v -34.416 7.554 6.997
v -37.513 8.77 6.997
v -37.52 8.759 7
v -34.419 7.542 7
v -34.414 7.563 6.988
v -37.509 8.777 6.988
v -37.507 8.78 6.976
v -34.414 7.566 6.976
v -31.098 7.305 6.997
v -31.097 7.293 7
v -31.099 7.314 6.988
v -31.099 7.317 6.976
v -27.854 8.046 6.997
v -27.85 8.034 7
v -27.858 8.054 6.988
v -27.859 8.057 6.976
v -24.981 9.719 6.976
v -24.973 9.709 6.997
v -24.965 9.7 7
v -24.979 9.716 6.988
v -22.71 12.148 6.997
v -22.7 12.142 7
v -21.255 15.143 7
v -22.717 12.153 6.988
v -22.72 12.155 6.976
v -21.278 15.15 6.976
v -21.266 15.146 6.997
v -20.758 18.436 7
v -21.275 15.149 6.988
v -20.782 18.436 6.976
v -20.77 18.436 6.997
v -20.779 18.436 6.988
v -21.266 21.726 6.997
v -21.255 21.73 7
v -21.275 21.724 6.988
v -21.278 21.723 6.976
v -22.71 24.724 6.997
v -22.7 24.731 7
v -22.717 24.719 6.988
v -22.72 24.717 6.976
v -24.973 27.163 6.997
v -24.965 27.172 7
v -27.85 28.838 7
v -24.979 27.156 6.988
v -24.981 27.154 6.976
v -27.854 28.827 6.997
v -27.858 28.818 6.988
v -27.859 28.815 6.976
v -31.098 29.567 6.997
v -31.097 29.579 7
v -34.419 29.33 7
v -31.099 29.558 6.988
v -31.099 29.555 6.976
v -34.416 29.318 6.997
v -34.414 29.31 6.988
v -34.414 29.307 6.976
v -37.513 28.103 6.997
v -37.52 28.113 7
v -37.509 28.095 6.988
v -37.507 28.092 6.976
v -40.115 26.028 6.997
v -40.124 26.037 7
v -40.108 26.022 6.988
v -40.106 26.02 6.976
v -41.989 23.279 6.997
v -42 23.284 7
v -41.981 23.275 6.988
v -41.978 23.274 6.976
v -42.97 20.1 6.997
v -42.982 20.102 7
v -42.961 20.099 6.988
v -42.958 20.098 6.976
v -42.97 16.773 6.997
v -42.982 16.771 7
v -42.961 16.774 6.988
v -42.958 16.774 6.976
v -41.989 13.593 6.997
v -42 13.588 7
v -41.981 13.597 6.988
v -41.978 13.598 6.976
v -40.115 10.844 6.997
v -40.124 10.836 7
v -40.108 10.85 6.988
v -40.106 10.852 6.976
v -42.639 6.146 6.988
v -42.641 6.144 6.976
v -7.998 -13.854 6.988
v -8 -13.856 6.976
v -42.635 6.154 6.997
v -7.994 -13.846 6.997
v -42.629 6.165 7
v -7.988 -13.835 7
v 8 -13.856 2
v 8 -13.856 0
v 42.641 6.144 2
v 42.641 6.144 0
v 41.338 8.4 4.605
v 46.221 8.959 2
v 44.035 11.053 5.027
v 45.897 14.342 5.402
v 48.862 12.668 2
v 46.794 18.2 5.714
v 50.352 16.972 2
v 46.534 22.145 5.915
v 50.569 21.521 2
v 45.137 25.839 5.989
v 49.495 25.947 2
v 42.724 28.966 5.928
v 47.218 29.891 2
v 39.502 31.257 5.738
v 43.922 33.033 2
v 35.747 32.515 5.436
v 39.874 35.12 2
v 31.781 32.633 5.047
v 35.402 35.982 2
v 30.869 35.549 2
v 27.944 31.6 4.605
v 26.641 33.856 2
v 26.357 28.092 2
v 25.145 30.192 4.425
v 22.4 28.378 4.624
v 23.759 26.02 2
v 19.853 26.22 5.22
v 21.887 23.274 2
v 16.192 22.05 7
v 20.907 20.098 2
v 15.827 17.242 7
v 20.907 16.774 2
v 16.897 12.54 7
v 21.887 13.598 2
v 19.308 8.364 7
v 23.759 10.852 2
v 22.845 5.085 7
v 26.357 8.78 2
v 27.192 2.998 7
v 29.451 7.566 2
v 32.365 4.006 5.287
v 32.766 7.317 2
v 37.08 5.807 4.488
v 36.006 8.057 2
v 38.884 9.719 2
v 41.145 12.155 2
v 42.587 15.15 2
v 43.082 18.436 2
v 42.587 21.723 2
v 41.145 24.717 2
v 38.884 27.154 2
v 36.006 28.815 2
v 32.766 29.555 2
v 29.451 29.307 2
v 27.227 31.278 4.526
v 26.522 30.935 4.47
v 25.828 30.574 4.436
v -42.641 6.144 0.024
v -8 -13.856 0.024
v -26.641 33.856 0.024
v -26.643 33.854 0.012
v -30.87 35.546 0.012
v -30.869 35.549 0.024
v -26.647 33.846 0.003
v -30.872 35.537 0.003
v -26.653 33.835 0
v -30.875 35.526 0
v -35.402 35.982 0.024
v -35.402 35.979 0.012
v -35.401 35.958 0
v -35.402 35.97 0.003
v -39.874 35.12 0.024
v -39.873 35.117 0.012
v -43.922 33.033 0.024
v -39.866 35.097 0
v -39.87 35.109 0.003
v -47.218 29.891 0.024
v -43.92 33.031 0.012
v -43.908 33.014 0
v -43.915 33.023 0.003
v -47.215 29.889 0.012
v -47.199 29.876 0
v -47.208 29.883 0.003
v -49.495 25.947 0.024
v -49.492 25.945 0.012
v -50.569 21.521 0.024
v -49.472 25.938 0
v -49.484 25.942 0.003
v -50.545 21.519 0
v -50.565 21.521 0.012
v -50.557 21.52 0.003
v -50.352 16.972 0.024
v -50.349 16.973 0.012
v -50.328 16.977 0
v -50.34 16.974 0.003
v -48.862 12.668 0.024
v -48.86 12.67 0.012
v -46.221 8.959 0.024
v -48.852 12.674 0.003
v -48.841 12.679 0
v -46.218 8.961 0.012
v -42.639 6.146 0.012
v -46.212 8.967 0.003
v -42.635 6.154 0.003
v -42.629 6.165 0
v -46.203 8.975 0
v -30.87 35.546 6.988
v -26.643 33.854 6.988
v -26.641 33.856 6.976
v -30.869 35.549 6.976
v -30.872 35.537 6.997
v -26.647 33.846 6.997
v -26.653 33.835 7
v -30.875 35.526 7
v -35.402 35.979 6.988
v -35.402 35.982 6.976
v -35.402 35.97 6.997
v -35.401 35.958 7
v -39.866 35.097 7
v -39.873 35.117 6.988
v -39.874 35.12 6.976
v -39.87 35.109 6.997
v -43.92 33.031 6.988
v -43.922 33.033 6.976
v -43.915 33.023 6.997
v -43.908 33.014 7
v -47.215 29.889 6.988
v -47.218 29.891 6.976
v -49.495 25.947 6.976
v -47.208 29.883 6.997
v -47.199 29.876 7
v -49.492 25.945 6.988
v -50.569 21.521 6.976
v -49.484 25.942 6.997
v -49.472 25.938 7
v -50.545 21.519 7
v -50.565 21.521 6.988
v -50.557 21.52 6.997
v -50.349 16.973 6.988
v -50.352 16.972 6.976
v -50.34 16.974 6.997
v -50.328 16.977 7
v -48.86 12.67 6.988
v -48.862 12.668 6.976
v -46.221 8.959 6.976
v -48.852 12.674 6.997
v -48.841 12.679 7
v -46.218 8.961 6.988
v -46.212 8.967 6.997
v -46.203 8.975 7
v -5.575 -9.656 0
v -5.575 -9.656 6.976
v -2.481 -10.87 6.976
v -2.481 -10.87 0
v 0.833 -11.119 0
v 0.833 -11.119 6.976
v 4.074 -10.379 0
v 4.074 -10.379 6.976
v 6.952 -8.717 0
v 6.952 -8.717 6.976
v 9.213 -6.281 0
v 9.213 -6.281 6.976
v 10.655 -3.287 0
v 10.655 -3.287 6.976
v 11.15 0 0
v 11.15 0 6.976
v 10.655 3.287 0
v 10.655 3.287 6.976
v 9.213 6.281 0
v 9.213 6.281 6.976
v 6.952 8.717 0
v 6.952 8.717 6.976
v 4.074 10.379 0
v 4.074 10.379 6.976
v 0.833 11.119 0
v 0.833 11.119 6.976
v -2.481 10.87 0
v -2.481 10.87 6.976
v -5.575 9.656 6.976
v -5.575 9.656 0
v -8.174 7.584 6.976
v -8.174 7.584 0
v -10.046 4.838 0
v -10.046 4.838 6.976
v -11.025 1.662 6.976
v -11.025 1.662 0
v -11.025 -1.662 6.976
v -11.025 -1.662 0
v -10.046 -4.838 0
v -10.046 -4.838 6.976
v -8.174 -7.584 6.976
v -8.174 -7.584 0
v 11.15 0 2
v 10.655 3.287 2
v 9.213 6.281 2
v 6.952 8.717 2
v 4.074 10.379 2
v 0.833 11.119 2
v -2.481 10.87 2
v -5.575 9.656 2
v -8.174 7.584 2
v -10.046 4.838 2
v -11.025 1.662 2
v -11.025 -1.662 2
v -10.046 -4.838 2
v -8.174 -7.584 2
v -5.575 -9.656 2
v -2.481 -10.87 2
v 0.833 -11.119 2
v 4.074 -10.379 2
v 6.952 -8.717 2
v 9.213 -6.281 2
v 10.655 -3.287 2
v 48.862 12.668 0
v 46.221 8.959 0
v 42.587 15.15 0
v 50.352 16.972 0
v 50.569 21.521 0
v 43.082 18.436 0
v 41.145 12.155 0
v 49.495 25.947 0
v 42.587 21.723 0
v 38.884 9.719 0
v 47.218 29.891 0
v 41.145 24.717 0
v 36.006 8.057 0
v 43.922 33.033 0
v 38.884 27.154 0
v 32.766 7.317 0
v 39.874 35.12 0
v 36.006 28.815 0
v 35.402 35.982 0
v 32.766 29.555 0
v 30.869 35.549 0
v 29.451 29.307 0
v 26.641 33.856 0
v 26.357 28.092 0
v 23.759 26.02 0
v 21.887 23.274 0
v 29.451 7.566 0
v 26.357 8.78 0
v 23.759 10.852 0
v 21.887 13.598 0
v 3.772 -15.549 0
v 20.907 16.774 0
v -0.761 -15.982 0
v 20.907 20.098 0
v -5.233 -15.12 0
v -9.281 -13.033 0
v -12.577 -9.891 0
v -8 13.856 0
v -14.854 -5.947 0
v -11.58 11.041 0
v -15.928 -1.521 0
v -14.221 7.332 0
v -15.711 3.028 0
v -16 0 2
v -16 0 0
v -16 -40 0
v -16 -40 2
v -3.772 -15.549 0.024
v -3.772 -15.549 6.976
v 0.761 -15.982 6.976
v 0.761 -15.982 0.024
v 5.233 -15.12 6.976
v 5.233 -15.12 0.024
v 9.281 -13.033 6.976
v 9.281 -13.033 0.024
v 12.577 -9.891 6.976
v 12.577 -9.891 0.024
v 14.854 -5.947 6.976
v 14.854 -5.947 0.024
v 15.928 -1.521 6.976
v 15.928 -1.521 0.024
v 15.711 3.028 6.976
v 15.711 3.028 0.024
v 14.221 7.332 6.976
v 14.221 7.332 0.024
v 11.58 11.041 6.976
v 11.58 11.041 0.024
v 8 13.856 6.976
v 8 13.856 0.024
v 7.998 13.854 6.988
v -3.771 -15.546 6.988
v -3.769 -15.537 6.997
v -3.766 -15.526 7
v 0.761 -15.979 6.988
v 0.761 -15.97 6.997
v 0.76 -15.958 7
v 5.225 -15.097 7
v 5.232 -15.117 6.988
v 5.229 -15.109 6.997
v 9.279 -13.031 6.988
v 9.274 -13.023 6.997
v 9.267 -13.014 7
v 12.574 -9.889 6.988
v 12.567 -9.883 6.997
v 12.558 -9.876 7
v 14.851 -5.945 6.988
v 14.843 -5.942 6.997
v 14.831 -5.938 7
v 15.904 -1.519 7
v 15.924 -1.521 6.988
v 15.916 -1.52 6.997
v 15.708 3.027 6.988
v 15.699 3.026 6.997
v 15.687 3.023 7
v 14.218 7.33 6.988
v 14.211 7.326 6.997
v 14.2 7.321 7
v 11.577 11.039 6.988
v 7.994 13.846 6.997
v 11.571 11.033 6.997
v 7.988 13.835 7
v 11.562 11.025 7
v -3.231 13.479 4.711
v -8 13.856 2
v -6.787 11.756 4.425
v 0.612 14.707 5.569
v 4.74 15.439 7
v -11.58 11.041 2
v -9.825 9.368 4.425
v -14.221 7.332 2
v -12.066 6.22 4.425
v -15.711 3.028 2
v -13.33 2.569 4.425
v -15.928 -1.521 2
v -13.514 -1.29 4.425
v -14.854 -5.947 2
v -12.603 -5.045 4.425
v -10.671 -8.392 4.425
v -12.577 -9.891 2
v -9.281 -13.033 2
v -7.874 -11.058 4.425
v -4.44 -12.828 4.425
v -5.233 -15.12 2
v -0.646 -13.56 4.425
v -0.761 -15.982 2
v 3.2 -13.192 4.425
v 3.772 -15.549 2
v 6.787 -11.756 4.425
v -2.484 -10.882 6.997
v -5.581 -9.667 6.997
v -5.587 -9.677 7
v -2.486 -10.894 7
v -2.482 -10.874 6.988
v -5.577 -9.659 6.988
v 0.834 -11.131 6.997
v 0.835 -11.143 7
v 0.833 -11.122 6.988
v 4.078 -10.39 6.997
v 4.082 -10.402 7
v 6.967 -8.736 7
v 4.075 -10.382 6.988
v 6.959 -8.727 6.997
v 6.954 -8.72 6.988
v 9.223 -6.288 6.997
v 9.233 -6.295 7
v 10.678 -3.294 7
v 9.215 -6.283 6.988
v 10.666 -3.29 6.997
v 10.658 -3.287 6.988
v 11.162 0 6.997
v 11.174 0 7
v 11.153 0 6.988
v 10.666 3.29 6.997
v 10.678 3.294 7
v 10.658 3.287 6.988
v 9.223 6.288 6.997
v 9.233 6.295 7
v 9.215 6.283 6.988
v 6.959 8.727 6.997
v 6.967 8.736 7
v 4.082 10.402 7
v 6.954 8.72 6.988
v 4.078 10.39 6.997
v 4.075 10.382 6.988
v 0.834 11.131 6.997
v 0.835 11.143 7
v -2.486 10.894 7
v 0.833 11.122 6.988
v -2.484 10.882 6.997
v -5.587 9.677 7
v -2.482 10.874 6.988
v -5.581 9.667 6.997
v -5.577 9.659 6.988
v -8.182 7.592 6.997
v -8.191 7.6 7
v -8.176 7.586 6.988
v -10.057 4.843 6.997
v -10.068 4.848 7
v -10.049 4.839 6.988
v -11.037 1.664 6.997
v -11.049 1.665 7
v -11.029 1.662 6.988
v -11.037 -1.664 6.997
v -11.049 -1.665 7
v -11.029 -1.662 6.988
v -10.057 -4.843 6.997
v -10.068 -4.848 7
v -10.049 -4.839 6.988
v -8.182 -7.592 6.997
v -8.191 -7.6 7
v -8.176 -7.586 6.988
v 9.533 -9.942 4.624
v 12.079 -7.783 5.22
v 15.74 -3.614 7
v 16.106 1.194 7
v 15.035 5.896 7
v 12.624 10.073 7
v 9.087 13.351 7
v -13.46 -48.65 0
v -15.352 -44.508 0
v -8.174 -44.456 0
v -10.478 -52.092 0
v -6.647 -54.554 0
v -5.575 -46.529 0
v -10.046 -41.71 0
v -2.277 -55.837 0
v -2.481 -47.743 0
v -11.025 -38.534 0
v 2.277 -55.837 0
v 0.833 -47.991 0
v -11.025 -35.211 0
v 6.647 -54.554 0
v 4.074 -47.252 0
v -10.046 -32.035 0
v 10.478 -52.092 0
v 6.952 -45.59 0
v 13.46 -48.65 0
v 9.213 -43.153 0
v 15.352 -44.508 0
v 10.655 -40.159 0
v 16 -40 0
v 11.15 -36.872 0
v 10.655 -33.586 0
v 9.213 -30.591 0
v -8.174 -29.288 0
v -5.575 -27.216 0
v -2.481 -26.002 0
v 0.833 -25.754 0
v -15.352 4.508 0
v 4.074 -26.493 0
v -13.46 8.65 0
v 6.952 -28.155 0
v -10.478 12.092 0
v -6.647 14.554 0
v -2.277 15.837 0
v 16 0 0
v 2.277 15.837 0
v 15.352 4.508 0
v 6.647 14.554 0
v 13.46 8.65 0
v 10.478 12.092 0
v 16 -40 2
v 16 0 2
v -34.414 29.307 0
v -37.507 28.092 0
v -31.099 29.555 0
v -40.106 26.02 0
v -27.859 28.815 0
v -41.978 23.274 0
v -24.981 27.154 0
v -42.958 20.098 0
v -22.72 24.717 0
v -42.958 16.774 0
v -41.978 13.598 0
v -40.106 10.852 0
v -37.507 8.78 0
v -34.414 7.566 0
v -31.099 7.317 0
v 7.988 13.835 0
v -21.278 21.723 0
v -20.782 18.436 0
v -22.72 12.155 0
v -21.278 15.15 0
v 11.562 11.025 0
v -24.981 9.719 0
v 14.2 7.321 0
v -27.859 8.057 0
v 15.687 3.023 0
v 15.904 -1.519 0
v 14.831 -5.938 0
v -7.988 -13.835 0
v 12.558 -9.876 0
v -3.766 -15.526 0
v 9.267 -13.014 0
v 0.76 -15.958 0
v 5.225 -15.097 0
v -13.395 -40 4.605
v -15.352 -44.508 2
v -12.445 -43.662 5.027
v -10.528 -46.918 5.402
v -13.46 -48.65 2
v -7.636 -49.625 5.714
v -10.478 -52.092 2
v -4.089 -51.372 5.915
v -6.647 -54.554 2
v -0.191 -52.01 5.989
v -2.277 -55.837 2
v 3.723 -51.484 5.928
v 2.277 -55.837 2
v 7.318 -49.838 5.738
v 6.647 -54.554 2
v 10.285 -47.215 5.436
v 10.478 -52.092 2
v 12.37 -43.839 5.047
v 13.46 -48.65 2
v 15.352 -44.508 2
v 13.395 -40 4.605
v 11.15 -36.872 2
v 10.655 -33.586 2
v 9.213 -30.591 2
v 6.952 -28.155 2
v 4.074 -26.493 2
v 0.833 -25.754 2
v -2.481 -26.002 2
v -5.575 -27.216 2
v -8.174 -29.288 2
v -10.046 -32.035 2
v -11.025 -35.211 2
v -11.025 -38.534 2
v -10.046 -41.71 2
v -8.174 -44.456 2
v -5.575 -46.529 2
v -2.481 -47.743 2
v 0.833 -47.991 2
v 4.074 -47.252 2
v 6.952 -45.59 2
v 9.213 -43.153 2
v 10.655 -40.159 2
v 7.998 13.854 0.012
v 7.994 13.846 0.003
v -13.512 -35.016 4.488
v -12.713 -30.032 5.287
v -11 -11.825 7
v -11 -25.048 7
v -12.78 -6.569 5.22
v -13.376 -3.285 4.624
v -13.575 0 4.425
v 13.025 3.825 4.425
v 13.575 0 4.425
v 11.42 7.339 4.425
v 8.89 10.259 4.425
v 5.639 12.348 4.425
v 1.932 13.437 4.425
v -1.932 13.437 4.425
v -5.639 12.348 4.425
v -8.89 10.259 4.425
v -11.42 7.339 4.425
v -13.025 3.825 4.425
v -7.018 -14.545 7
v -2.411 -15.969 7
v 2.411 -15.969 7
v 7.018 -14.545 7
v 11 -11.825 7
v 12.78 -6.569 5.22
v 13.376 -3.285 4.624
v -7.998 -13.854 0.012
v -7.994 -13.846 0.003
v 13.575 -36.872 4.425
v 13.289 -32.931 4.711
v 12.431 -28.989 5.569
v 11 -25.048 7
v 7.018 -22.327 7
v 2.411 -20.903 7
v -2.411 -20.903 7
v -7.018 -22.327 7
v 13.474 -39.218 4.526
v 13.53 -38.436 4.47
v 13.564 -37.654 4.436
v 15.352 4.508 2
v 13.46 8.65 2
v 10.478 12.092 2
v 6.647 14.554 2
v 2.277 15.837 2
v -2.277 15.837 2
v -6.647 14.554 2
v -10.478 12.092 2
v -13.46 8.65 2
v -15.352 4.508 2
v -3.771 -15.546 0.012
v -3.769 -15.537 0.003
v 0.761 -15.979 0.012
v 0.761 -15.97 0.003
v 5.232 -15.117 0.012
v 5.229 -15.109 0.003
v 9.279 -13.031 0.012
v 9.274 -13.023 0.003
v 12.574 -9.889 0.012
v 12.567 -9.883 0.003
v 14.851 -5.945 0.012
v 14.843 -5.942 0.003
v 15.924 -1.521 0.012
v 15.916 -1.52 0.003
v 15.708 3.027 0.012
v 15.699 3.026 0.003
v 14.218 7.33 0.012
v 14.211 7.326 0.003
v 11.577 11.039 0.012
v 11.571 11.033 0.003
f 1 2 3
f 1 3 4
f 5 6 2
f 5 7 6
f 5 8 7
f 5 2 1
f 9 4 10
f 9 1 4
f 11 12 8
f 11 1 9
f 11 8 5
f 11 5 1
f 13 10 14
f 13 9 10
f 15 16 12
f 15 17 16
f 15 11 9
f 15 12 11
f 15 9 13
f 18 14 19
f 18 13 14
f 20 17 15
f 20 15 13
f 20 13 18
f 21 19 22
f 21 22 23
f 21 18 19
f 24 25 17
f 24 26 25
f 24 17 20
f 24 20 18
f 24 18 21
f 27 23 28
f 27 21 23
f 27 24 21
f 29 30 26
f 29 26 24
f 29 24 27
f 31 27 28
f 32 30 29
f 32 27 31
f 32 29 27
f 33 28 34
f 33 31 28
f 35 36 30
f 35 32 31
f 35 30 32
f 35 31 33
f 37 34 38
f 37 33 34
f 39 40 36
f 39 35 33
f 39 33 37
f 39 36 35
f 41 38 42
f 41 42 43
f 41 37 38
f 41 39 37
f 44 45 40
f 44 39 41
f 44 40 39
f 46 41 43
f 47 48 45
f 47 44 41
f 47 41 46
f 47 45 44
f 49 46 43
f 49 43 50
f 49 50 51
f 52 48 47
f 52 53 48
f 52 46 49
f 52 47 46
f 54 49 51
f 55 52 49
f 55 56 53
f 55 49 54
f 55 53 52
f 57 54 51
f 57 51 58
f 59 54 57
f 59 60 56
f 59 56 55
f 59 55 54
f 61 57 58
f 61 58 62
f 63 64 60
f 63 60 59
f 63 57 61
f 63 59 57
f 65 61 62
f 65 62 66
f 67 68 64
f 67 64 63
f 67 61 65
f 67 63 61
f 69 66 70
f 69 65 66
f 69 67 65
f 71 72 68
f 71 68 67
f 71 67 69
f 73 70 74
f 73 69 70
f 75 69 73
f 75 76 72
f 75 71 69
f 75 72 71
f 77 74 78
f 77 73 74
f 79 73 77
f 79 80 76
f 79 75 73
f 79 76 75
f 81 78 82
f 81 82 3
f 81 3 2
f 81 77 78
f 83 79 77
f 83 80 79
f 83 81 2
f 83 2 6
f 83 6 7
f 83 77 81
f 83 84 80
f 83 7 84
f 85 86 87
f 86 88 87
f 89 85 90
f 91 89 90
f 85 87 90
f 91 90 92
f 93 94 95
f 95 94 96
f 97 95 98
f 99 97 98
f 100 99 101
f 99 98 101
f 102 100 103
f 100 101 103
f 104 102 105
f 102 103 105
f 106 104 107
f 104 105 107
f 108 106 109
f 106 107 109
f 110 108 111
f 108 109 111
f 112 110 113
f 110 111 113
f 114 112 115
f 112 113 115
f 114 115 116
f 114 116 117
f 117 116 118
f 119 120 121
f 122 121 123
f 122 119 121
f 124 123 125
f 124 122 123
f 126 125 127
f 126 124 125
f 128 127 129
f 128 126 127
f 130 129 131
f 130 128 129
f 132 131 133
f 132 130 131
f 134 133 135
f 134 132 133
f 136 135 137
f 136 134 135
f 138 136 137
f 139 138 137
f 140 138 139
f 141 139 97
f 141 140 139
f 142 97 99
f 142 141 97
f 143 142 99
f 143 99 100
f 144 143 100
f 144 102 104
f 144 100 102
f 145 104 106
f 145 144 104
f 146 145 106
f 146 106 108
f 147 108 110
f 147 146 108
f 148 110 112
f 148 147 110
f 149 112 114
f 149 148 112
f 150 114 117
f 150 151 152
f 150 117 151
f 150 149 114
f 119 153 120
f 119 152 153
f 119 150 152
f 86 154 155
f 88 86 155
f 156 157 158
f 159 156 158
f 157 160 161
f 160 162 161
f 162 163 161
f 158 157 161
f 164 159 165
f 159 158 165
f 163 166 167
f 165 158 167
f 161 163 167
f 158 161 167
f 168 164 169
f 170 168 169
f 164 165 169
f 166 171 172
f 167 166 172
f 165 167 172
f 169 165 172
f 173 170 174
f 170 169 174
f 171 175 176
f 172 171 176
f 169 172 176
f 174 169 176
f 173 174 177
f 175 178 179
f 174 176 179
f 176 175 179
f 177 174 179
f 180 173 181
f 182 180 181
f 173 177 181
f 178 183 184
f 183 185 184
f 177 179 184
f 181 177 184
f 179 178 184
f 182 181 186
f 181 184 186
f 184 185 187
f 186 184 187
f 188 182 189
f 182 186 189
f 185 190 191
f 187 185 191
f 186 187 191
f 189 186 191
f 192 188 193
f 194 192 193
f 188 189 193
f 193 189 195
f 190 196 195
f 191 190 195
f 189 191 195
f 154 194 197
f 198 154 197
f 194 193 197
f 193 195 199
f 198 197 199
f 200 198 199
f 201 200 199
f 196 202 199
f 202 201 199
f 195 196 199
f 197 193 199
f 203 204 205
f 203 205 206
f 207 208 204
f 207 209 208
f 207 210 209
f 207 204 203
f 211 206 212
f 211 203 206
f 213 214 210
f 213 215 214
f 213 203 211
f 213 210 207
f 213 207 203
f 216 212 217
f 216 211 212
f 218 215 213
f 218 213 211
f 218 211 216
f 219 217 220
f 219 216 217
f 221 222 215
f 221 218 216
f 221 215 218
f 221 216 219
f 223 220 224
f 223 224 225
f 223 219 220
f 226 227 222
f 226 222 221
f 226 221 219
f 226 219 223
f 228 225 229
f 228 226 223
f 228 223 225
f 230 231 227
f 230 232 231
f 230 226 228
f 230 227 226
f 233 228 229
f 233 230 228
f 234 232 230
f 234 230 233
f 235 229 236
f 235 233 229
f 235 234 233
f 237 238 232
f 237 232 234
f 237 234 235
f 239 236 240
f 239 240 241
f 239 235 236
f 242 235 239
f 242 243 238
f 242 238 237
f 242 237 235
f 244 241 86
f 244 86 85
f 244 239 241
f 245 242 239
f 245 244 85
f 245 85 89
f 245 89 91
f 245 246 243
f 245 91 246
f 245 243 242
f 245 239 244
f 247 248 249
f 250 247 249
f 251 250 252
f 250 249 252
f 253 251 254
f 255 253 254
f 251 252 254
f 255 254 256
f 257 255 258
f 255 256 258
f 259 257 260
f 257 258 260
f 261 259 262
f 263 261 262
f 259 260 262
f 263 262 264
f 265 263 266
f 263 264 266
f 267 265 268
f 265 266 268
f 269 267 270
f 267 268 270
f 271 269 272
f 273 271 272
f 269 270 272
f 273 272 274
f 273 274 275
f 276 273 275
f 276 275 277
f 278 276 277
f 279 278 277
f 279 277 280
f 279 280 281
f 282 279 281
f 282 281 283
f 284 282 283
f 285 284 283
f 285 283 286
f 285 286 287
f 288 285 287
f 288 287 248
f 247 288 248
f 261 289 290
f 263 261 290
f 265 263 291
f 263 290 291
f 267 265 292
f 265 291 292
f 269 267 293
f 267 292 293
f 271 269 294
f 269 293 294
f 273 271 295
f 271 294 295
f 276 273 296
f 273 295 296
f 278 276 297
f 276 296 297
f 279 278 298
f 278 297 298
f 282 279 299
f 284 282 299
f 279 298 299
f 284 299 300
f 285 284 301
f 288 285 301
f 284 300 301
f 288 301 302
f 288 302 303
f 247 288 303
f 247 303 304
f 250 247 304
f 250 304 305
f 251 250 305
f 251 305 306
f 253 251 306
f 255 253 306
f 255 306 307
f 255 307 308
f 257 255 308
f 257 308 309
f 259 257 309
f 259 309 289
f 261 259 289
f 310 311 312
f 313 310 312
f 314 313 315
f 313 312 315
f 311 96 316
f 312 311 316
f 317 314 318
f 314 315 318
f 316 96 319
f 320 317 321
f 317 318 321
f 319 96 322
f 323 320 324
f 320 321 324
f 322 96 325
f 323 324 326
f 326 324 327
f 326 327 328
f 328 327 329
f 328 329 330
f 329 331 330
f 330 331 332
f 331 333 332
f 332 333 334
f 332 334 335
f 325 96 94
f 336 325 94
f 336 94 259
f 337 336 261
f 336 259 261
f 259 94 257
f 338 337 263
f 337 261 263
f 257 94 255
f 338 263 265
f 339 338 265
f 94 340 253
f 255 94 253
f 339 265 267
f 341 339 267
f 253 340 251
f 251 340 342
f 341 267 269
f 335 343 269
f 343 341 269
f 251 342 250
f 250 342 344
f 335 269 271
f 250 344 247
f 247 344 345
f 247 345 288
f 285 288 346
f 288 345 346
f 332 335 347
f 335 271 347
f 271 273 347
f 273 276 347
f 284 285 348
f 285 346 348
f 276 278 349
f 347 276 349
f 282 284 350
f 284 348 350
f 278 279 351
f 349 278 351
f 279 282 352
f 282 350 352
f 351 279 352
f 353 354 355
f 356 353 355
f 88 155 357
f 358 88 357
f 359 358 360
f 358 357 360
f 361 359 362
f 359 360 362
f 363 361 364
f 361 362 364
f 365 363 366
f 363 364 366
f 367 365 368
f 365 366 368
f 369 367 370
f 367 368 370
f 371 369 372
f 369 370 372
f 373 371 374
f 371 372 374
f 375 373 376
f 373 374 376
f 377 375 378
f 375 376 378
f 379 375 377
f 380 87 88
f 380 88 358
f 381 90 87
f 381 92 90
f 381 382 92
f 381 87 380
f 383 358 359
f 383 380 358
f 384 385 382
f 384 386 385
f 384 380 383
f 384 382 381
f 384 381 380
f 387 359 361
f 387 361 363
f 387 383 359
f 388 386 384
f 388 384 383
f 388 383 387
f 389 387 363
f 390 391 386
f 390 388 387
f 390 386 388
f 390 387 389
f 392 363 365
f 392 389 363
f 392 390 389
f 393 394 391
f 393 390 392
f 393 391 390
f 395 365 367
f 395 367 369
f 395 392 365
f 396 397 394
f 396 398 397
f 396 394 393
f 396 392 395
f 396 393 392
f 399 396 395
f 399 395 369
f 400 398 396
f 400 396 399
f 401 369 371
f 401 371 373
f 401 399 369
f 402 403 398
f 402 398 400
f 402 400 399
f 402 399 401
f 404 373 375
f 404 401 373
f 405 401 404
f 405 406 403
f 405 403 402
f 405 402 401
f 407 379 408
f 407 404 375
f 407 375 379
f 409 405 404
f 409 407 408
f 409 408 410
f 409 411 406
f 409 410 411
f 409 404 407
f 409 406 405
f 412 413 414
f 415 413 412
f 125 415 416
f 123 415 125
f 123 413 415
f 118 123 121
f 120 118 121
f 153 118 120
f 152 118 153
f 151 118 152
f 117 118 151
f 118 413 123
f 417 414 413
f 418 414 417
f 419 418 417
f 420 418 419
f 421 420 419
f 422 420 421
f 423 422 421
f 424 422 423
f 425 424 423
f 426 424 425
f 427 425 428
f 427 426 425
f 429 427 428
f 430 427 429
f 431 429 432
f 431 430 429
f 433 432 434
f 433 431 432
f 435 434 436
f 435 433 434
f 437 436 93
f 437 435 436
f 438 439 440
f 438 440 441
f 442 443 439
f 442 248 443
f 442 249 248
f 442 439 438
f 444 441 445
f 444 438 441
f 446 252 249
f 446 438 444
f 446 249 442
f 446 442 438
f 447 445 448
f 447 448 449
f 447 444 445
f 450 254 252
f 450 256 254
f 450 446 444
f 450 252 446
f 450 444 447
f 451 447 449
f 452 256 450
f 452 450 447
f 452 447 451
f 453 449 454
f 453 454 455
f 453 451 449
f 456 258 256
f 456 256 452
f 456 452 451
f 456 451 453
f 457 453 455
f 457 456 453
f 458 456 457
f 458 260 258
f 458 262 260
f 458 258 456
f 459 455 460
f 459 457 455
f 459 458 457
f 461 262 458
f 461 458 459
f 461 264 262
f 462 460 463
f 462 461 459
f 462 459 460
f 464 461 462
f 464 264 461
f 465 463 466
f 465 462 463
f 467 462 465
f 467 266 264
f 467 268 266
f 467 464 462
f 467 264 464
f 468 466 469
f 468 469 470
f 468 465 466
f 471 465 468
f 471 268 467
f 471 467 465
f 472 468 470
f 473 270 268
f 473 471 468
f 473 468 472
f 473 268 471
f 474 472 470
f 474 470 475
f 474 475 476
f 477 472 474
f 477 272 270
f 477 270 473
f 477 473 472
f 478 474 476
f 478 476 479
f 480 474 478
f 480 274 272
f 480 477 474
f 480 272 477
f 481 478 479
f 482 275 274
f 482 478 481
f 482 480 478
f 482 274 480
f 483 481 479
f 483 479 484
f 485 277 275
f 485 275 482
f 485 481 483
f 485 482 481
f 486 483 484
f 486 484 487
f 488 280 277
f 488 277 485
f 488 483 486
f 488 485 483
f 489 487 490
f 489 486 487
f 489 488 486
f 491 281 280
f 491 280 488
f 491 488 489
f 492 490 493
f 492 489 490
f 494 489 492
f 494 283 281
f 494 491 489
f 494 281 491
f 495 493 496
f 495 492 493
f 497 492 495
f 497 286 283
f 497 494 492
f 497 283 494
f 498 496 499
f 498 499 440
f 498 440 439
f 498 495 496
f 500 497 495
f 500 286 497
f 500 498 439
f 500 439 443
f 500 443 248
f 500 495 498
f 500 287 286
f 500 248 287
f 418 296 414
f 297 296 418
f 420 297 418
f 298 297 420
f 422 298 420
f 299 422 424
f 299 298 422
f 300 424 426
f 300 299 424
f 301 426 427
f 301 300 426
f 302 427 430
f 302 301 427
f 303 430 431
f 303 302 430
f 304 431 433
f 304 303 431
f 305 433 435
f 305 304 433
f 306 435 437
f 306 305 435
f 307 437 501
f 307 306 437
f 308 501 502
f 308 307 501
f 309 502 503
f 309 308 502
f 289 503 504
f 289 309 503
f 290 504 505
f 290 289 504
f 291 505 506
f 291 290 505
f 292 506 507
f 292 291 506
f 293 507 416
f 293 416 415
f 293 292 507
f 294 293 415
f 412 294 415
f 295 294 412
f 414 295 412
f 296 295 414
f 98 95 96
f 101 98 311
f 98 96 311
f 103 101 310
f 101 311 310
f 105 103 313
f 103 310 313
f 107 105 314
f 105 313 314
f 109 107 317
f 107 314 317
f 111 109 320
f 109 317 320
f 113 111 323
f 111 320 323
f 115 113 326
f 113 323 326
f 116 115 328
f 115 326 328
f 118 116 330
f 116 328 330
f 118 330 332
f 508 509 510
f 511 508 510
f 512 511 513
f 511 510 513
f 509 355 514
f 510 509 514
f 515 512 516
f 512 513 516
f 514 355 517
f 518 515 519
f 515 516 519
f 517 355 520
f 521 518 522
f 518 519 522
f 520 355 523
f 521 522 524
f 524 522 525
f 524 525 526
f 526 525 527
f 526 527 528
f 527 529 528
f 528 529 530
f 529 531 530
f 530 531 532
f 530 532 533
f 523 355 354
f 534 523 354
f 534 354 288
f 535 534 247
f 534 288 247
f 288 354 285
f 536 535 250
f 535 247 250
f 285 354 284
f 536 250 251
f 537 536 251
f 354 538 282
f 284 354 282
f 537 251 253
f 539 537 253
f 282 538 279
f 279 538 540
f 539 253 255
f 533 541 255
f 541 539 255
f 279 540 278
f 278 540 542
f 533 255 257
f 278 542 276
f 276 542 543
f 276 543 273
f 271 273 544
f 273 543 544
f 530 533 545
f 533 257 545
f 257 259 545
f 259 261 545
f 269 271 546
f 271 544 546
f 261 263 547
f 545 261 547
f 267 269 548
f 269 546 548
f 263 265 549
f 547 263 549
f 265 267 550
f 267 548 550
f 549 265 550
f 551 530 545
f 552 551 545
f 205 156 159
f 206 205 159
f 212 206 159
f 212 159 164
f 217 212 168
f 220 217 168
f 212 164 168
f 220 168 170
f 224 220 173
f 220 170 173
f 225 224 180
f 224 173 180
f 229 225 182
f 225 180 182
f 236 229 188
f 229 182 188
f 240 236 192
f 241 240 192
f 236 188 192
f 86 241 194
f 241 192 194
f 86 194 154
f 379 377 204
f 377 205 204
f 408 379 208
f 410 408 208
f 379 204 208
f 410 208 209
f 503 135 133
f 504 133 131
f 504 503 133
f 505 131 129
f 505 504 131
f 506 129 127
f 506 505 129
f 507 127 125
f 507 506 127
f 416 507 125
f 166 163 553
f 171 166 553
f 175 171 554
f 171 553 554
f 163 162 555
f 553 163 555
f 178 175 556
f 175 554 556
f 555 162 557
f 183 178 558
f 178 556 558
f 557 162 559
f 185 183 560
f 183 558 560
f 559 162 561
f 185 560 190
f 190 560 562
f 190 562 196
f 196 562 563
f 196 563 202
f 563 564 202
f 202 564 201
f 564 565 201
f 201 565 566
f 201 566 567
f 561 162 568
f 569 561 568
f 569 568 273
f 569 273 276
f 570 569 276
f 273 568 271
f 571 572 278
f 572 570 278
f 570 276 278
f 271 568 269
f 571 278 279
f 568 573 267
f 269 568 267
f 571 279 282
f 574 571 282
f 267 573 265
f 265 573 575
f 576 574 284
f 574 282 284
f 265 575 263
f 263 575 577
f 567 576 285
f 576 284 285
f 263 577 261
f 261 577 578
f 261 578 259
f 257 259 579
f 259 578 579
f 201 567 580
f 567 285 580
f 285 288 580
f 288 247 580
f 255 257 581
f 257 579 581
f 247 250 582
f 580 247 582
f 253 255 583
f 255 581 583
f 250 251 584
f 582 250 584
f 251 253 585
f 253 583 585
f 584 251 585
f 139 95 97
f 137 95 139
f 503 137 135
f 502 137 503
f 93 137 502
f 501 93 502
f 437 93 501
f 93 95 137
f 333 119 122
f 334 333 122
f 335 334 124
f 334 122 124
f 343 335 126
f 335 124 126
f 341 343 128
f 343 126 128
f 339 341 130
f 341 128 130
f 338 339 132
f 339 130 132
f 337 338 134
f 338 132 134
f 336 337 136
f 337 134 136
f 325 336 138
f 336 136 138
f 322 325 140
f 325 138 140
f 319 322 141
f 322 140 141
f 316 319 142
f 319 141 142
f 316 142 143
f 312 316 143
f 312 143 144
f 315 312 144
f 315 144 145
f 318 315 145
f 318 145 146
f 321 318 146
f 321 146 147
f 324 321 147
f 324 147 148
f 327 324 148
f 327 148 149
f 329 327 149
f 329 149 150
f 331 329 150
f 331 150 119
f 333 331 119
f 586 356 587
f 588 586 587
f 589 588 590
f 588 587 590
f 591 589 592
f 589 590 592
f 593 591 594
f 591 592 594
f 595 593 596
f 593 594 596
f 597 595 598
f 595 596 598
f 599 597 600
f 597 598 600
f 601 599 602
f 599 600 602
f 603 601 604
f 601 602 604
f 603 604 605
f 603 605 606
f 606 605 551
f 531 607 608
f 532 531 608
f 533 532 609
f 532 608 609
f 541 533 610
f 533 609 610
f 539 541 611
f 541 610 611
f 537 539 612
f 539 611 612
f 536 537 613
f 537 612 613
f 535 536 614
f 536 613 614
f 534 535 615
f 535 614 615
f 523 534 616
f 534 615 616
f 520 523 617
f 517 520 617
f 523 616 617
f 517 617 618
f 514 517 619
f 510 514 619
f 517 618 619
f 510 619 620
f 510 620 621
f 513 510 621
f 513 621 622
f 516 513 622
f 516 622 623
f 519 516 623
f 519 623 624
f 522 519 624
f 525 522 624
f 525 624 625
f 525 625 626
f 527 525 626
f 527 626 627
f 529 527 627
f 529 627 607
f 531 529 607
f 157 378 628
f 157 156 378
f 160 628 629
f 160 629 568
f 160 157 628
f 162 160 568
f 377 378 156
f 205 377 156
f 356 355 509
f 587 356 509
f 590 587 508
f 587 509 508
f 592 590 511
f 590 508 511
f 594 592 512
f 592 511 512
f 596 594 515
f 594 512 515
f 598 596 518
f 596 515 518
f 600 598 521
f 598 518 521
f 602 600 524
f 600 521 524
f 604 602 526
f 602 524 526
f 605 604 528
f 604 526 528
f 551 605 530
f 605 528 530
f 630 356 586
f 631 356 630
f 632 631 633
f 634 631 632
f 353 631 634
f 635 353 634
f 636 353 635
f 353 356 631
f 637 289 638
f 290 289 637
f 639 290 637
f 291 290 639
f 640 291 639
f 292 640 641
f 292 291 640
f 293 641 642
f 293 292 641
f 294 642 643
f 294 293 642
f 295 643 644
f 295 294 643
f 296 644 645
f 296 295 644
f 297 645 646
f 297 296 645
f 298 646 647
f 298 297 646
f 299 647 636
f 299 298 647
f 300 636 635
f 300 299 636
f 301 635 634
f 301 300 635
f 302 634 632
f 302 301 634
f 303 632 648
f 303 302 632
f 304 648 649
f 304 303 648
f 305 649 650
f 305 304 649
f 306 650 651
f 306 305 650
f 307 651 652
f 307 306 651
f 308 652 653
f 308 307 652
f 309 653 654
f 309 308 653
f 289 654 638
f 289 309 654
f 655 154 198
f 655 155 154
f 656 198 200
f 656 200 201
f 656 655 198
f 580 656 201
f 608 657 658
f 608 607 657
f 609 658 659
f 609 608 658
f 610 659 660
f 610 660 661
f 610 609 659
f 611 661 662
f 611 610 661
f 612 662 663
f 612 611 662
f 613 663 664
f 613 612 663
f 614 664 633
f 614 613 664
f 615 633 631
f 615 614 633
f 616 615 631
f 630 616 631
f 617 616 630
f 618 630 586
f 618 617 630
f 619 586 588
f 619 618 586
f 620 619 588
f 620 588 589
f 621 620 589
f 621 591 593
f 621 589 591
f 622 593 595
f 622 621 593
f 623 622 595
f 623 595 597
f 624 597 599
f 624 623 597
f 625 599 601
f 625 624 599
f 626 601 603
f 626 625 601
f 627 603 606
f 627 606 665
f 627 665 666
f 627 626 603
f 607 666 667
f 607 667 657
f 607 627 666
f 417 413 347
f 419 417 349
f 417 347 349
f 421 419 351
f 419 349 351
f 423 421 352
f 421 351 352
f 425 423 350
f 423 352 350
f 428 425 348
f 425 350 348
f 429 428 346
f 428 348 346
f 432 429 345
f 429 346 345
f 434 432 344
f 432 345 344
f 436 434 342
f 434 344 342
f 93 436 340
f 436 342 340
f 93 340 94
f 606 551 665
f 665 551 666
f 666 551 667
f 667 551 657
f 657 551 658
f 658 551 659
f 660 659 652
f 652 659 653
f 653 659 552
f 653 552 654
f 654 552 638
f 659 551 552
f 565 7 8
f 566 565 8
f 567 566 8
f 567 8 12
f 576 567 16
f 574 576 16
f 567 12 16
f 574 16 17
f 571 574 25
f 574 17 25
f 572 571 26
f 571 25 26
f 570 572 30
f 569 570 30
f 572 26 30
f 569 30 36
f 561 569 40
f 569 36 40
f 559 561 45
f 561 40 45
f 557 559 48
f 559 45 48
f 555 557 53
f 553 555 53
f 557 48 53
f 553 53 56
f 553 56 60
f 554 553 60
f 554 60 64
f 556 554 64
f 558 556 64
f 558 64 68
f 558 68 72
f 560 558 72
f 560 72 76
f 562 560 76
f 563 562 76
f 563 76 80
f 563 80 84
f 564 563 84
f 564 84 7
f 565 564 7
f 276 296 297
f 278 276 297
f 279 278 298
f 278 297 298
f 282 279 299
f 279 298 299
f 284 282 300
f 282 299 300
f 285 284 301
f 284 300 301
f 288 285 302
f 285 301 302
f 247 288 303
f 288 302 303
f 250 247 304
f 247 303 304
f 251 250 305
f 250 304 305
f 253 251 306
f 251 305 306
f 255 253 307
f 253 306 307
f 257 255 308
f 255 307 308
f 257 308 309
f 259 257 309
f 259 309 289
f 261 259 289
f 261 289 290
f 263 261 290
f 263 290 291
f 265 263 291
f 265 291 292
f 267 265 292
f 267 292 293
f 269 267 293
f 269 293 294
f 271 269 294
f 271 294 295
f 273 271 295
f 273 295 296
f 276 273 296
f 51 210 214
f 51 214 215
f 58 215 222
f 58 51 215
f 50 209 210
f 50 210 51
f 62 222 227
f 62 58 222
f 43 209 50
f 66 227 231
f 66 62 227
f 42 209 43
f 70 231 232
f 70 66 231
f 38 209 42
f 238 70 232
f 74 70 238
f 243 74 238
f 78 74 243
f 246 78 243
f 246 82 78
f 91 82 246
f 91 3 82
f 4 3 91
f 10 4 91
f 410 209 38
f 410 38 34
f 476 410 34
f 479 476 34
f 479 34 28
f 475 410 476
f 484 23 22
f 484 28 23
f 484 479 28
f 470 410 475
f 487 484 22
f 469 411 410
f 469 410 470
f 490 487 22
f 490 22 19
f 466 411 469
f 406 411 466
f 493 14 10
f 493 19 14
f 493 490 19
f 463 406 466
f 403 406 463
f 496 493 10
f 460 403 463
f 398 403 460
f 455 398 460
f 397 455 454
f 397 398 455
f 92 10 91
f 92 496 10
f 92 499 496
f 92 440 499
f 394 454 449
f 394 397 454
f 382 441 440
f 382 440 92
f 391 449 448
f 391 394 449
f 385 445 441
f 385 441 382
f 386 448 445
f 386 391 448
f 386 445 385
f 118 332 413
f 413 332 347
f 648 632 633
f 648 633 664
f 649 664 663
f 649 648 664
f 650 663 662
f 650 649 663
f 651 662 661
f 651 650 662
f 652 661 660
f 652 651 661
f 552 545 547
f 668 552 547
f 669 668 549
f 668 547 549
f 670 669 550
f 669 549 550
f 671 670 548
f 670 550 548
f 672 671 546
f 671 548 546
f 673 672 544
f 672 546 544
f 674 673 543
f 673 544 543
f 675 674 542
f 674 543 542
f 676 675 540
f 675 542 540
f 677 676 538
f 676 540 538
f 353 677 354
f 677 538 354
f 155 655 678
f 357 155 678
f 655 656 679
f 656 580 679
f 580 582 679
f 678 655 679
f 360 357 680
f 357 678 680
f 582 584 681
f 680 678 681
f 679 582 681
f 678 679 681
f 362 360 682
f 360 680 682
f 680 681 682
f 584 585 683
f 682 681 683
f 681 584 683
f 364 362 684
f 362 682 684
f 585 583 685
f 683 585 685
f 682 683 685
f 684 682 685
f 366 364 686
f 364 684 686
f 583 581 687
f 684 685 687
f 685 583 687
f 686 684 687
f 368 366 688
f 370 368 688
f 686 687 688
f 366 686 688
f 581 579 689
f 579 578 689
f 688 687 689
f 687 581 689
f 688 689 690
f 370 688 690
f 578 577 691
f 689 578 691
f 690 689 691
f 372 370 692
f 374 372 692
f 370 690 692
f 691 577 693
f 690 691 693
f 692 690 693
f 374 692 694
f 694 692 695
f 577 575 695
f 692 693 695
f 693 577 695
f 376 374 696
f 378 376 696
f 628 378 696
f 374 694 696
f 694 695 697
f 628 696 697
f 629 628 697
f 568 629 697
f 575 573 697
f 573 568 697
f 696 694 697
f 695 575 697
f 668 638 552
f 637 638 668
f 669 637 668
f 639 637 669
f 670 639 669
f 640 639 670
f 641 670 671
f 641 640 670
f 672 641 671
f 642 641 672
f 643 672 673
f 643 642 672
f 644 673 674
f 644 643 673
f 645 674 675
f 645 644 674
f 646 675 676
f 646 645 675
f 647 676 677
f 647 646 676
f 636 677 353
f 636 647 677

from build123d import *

# Parameters (mm, degrees)
F1_DEPTH    = 7
F2_R        = 11.15
F3_DEPTH    = 7.001
F5_COUNT    = 3
F6_R        = 0.0241421356
F7_T1_DEPTH = 40
F7_T3_DEPTH = 40
F7_T6_ANGLE = 180
F7_T8_ANGLE = 180
F8_T1_DEPTH = 40
F8_T4_ANGLE = 180
F8_T6_ANGLE = 180


# Not quite as in the source:
# - a fillet or chamfer that OpenCascade refuses, or shapes differently, is made with other operations: its cross-section is extruded or revolved along the edge and cut away or added


with BuildPart() as f1:
    # F0 (on Top) → F1 (new body)
    with BuildSketch(Plane.XY):
        with BuildLine():
            ThreePointArc((-16, 0), (0, -16), (16, 0))
            ThreePointArc((16, 0), (0, 16), (-16, 0))
        make_face()
        with BuildLine():
            Line((16, -40), (16, 0))
            ThreePointArc((16, 0), (0, -16), (-16, 0))
            Line((-16, 0), (-16, -40))
            ThreePointArc((-16, -40), (0, -24), (16, -40))
        make_face()
        with BuildLine():
            ThreePointArc((-16, -40), (0, -56), (16, -40))
            ThreePointArc((16, -40), (0, -24), (-16, -40))
        make_face()
    extrude(amount=F1_DEPTH)

    # F2 (on face) → F3 (cut, through all)
    with BuildSketch(Plane.XY.offset(7)):
        Circle(F2_R)
        with Locations((0, -36.8724052611)):
            Circle(F2_R)
    extrude(amount=-F3_DEPTH, mode=Mode.SUBTRACT)


with BuildPart() as f5_1:
    # F5: instance of F1
    add(f1.part.rotate(Axis((0, 0, -10.0436238572), (0, 0, -1)), 1 * 360 / F5_COUNT))

    # F6
    f6_edges = [f5_1.edges().sort_by_distance(p)[0] for p in [
        (-26.641016, 33.856406, 3.5),
        (13.856406, -8, 7),
        (-25.320508, -3.856406, 7),
        (-9.320508, 23.856406, 7),
        (-48.497423, 28, 7),
        (-26.35744, 28.092386, 7),
        (5.575, 9.656183, 7),
        (-42.641016, 6.143594, 3.5),
        (-8, -13.856406, 3.5),
        (-25.320508, -3.856406, 0),
        (-9.320508, 23.856406, 0),
    ]]
    fillet(f6_edges, radius=F6_R)


with BuildPart() as f5_2:
    # F5: instance of F1
    add(f1.part.rotate(Axis((0, 0, -10.0436238572), (0, 0, -1)), 2 * 360 / F5_COUNT))

    # F7: chamfer of 5 on 6 edges, made by hand

    # F7_s2 → F7_t1 (cut)
    with BuildSketch(Plane(origin=(34.6410161514, 20, 0), x_dir=(0, 0, 1), z_dir=(-0.8660254038, -0.5, 0))):
        Polygon((2, 16), (7, 11), (7, 16), align=None)
    extrude(amount=F7_T1_DEPTH, mode=Mode.SUBTRACT)

    # F7_s4 → F7_t3 (cut)
    with BuildSketch(Plane(origin=(0, 0, 0), x_dir=(0, 0, 1), z_dir=(0.8660254038, 0.5, 0))):
        Polygon((2, 16), (7, 11), (7, 16), align=None)
    extrude(amount=F7_T3_DEPTH, mode=Mode.SUBTRACT)

    # F7_s5 → F7_t6 (revolve, cut)
    with BuildSketch(Plane(origin=(0, 0, 0), x_dir=(0, 0, 1), z_dir=(0.8660254038, 0.5, 0))):
        Polygon((2, -16), (7, -11), (7, -16), align=None)
    revolve(axis=Axis((0, 0, 7), (0, 0, 1)), revolution_arc=F7_T6_ANGLE, mode=Mode.SUBTRACT)

    # F7_s7 → F7_t8 (revolve, cut)
    with BuildSketch(Plane(origin=(34.6410161514, 20, 0), x_dir=(0, 0, 1), z_dir=(-0.8660254038, -0.5, 0))):
        Polygon((7, -11), (2, -16), (7, -16), align=None)
    revolve(axis=Axis((34.6410161514, 20, 7), (0, 0, 1)), revolution_arc=F7_T8_ANGLE, mode=Mode.SUBTRACT)

    # F7_s9 → F7_t10 (revolve, cut)
    with BuildSketch(Plane(origin=(31.9324396547, 18.4362026305, 0), x_dir=(0, 0, 1), z_dir=(0.8660254038, 0.5, 0))):
        Polygon((7, -16.15), (2, -11.15), (7, -11.15), align=None)
    revolve(axis=Axis((31.9324396547, 18.4362026305, 7), (0, 0, 1)), mode=Mode.SUBTRACT)

    # F7_s11 → F7_t12 (revolve, cut)
    with BuildSketch(Plane(origin=(0, 0, 0), x_dir=(0, 0, 1), z_dir=(0.8660254038, 0.5, 0))):
        Polygon((7, -16.15), (2, -11.15), (7, -11.15), align=None)
    revolve(axis=Axis((0, 0, 7), (0, 0, 1)), mode=Mode.SUBTRACT)


with BuildPart() as f1_1:
    add(f1.part)

    # F8: chamfer of 5 on 6 edges, made by hand

    # F8_s2 → F8_t1 (cut)
    with BuildSketch(Plane.XZ):
        Polygon((16, 2), (11, 7), (16, 7), align=None)
        Polygon((-16, 2), (-11, 7), (-16, 7), align=None)
    extrude(amount=F8_T1_DEPTH, mode=Mode.SUBTRACT)

    # F8_s3 → F8_t4 (revolve, cut)
    with BuildSketch(Plane.XZ):
        Polygon((16, 2), (11, 7), (16, 7), align=None)
    revolve(axis=Axis((0, 0, 7), (0, 0, 1)), revolution_arc=F8_T4_ANGLE, mode=Mode.SUBTRACT)

    # F8_s5 → F8_t6 (revolve, cut)
    with BuildSketch(Plane.XZ.offset(40)):
        Polygon((-11, 7), (-16, 2), (-16, 7), align=None)
    revolve(axis=Axis((0, -40, 7), (0, 0, 1)), revolution_arc=F8_T6_ANGLE, mode=Mode.SUBTRACT)

    # F8_s7 → F8_t8 (revolve, cut)
    with BuildSketch(Plane.XZ.offset(36.8724052611)):
        Polygon((16.15, 7), (11.15, 2), (11.15, 7), align=None)
    revolve(axis=Axis((0, -36.8724052611, 7), (0, 0, 1)), mode=Mode.SUBTRACT)

    # F8_s9 → F8_t10 (revolve, cut)
    with BuildSketch(Plane.XZ):
        Polygon((16.15, 7), (11.15, 2), (11.15, 7), align=None)
    revolve(axis=Axis((0, 0, 7), (0, 0, 1)), mode=Mode.SUBTRACT)


solid = Compound([f5_1.part, f5_2.part, f1_1.part])
